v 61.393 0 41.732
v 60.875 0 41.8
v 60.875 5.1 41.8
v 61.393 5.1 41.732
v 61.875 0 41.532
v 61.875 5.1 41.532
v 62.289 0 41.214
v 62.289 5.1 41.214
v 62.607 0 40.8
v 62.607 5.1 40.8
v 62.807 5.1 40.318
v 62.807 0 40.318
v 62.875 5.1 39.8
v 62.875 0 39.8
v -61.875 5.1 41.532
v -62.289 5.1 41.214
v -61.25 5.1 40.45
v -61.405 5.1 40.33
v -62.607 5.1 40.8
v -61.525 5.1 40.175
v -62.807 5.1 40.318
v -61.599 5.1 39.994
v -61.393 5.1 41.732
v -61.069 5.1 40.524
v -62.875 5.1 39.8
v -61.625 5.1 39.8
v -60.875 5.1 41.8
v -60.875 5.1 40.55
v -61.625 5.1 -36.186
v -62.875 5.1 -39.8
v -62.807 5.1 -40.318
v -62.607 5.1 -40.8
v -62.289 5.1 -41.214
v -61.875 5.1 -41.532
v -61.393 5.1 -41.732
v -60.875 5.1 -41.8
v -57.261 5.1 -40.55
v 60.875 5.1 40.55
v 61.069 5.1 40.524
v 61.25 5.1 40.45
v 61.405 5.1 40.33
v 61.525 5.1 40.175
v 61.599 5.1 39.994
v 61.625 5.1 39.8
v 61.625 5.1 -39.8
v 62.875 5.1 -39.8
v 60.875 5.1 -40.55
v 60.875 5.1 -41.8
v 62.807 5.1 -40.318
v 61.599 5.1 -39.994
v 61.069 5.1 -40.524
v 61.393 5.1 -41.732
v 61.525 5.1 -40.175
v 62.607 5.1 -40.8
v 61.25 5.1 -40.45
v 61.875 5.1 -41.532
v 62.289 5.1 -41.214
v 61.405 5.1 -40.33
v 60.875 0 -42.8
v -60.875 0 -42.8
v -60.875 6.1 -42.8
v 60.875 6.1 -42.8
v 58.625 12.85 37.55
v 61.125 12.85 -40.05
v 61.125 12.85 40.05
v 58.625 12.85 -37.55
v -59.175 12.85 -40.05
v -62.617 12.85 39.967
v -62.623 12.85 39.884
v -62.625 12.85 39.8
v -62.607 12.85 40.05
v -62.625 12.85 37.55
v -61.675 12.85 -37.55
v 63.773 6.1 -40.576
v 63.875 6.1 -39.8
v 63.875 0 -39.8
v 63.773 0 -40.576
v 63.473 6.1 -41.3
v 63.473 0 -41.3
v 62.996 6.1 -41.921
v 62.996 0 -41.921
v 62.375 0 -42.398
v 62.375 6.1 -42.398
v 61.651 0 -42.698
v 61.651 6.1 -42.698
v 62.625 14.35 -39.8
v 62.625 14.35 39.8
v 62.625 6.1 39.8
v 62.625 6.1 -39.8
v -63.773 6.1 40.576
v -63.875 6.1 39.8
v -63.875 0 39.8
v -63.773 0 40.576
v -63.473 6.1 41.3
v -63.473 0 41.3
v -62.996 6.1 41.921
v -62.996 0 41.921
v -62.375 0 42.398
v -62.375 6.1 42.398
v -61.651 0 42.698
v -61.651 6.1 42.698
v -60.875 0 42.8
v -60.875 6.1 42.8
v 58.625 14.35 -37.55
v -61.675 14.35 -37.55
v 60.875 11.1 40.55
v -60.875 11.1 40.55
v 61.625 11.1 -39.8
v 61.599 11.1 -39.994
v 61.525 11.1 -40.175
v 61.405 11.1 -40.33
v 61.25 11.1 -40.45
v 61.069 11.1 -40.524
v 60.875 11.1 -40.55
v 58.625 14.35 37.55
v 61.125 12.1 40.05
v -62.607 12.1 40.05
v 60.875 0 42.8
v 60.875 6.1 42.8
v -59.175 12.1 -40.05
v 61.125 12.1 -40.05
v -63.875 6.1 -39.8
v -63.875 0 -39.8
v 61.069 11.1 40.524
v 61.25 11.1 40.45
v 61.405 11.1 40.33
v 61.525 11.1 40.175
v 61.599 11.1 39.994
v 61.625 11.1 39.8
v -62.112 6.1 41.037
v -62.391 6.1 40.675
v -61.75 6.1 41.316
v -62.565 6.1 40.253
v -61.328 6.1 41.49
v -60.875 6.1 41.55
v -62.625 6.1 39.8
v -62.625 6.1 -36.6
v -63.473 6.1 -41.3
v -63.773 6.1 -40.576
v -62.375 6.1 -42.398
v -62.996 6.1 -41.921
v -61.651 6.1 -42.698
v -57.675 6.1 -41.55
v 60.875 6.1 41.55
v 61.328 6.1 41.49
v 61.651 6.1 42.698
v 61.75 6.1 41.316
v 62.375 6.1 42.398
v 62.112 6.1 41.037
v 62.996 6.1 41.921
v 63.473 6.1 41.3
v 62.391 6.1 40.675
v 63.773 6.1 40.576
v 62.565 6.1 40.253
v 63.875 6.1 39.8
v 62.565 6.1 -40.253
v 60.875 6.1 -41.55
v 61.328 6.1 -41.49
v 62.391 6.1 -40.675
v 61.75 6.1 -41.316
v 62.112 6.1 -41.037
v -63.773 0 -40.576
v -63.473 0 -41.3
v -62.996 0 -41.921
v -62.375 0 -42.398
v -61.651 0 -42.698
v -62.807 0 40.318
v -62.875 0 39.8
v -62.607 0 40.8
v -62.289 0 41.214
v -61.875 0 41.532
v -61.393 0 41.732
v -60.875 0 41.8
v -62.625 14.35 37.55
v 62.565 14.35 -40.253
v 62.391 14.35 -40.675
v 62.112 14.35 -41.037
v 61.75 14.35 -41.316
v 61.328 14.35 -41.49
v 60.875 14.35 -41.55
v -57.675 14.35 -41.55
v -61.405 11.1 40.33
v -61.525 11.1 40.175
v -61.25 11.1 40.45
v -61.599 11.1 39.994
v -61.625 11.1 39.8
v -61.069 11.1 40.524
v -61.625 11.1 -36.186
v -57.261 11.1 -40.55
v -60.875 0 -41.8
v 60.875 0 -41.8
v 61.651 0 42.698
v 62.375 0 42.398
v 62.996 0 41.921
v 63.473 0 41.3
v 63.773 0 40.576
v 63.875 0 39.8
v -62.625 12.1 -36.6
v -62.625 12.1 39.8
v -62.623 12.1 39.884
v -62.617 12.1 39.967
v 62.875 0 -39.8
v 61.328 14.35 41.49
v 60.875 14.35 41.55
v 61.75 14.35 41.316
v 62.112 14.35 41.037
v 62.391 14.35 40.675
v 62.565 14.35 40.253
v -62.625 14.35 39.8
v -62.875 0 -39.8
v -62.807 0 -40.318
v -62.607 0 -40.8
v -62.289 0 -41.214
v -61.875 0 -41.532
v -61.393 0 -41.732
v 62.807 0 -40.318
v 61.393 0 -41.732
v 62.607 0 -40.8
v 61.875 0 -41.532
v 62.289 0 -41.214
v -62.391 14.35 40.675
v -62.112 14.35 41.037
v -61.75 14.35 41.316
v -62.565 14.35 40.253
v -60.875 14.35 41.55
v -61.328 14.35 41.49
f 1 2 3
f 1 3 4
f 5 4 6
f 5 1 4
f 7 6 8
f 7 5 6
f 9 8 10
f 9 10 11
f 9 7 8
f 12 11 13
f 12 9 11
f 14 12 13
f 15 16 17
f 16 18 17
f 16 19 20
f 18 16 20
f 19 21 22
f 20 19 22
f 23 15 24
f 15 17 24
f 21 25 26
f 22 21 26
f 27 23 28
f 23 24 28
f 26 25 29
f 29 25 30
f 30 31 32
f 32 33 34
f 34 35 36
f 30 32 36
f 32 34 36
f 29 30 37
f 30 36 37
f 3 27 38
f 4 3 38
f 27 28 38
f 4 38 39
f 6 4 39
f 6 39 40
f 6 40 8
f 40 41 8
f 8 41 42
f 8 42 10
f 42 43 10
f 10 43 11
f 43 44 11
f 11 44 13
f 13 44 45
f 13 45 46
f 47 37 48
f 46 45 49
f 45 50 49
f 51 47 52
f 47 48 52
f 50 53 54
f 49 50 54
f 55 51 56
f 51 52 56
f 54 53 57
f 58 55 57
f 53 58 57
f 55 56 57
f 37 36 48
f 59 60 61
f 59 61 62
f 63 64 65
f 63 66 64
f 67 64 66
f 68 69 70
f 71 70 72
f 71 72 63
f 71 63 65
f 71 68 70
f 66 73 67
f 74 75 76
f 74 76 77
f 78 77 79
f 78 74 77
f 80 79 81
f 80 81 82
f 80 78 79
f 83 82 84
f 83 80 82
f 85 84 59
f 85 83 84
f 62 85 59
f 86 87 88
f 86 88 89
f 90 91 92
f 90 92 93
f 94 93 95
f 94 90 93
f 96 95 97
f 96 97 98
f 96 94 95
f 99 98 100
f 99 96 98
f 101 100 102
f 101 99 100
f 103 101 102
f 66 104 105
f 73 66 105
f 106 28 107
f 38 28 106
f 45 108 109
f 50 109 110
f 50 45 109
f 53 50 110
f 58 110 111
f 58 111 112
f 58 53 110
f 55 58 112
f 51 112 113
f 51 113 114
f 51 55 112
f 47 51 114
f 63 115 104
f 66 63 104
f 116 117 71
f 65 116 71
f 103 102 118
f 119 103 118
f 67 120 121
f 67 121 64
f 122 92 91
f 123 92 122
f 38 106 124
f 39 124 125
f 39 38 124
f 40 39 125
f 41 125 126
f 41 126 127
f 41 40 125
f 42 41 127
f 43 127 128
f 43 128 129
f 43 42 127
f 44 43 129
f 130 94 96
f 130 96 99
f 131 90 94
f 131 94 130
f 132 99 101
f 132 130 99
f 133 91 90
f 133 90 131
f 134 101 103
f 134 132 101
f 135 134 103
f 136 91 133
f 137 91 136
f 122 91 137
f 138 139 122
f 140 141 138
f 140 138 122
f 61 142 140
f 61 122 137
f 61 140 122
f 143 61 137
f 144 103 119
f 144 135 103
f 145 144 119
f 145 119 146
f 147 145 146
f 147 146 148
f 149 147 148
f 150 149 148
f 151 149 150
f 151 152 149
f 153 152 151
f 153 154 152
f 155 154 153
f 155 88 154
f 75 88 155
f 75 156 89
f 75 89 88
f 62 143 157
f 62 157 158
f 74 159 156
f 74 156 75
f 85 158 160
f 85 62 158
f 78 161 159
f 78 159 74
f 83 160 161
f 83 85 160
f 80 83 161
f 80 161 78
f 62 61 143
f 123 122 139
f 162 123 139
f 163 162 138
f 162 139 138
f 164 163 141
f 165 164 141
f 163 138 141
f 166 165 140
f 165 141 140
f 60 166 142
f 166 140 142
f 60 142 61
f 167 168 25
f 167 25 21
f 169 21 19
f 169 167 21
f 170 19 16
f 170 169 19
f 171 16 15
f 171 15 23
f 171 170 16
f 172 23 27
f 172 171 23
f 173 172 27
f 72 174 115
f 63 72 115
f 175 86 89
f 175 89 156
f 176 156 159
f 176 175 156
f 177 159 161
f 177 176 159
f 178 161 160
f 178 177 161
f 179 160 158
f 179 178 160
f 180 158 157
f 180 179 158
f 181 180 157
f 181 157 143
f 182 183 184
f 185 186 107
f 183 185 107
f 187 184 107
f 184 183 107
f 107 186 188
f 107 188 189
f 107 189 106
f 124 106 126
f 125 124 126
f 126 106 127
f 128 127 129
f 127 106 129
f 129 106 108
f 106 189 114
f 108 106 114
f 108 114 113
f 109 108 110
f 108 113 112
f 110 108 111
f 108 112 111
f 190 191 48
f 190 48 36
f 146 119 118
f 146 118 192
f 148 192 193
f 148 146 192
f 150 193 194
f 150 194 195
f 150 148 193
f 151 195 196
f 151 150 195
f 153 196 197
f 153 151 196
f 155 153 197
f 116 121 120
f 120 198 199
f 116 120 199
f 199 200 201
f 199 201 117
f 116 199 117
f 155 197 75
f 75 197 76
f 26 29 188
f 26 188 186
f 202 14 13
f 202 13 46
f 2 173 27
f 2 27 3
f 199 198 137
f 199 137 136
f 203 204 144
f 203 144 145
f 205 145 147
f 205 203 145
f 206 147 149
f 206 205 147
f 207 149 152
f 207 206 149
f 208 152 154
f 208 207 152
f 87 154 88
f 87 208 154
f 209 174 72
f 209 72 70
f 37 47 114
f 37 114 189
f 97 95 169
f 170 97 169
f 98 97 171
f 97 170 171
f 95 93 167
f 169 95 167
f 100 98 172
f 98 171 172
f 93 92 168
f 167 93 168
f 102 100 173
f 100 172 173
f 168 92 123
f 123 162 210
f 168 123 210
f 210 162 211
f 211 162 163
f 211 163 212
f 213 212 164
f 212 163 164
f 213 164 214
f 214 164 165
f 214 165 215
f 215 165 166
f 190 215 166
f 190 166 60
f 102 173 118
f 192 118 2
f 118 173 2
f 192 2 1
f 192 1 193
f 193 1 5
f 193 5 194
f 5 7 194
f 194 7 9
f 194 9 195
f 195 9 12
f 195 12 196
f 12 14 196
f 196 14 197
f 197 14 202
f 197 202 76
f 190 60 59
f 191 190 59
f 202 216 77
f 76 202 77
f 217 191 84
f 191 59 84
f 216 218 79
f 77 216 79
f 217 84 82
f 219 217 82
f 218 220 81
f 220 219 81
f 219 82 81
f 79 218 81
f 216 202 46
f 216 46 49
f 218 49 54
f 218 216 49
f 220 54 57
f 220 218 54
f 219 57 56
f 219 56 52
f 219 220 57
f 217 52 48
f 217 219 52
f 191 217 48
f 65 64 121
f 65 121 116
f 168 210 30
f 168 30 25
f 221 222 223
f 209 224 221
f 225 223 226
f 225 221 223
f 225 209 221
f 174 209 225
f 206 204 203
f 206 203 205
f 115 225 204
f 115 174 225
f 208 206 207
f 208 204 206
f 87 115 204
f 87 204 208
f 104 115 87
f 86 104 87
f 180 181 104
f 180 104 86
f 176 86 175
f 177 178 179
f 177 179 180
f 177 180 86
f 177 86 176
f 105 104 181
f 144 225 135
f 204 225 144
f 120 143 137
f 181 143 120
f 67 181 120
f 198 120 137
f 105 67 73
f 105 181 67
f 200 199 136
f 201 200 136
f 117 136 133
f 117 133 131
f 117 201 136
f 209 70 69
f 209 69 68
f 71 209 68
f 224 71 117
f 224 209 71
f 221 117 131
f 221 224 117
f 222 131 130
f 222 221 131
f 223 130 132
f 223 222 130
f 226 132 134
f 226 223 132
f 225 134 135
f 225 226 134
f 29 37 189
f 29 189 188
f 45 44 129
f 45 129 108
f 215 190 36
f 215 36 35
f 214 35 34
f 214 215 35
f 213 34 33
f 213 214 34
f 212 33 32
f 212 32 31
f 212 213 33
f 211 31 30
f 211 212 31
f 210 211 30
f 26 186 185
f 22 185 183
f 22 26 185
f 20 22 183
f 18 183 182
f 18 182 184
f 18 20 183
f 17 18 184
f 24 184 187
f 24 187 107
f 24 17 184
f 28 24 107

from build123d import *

# Parameters (mm, degrees)
SKETCH1_W           = 127.75
SKETCH1_H           = 85.6
BOSS_EXTRUDE1_DEPTH = 14.35
FILLET1_R           = 3
CUT_FLANGE_DEPTH    = 8.25
SKETCH5_W           = 80.1
SKETCH5_H           = 0.75
CUT_PAPERSLOT_DEPTH = 123.75
CUT_OPENTOP_REACH   = 80.216
SHELL1_DEPTH        = 11.1
SHELL1_2_DEPTH      = 5.1


# Read off the part's stored shape, not the designer's step: Shell1
with BuildPart() as part:
    # Sketch1 → Boss-Extrude1 (new body)
    with BuildSketch(Plane(origin=(0, 0, 0), x_dir=(1, 0, 0), z_dir=(0, 1, 0))):
        Rectangle(SKETCH1_W, SKETCH1_H)
    extrude(amount=BOSS_EXTRUDE1_DEPTH)

    # Fillet1
    fillet1_edges = [part.edges().sort_by_distance(p)[0] for p in [
        (-63.875, 7.175, -42.8),
        (63.875, 7.175, -42.8),
        (63.875, 7.175, 42.8),
        (-63.875, 7.175, 42.8),
    ]]
    fillet(fillet1_edges, radius=FILLET1_R)

    # Sketch3 → Cut-Flange (cut)
    with BuildSketch(Plane(origin=(0, 14.35, 0), x_dir=(1, 0, 0), z_dir=(0, 1, 0))):
        with BuildLine():
            Line((-63.875, 39.8), (-63.875, -39.8))
            ThreePointArc((-63.875, -39.8), (-62.996320344, -41.921320344), (-60.875, -42.8))
            Line((-60.875, -42.8), (60.875, -42.8))
            ThreePointArc((60.875, -42.8), (62.996320344, -41.921320344), (63.875, -39.8))
            Line((63.875, -39.8), (63.875, 39.8))
            ThreePointArc((63.875, 39.8), (62.996320344, 41.921320344), (60.875, 42.8))
            Line((60.875, 42.8), (-60.875, 42.8))
            ThreePointArc((-60.875, 42.8), (-62.996320344, 41.921320344), (-63.875, 39.8))
        make_face()
        with BuildLine():
            Line((-62.625, 36.600252532), (-62.625, -39.8))
            ThreePointArc((-62.625, -39.8), (-62.112436867, -41.037436867), (-60.875, -41.55))
            Line((-60.875, -41.55), (60.875, -41.55))
            ThreePointArc((60.875, -41.55), (62.112436867, -41.037436867), (62.625, -39.8))
            Line((62.625, -39.8), (62.625, 39.8))
            ThreePointArc((62.625, 39.8), (62.112436867, 41.037436867), (60.875, 41.55))
            Line((60.875, 41.55), (-57.675252532, 41.55))
            Line((-57.675252532, 41.55), (-62.625, 36.600252532))
        make_face(mode=Mode.SUBTRACT)
    extrude(amount=-CUT_FLANGE_DEPTH, mode=Mode.SUBTRACT)

    # Sketch5 → Cut-PaperSlot (cut)
    with BuildSketch(Plane.ZY.offset(62.625)):
        with Locations((0, 12.475)):
            Rectangle(SKETCH5_W, SKETCH5_H)
    extrude(amount=-CUT_PAPERSLOT_DEPTH, mode=Mode.SUBTRACT)

    # Sketch6 → Cut-OpenTop (cut, up to next)
    with BuildSketch(Plane(origin=(0, 14.35, 0), x_dir=(1, 0, 0), z_dir=(0, 1, 0)), mode=Mode.PRIVATE) as cut_opentop_sk1:
        Polygon((-57.675252532, 37.55), (-61.675252532, 37.55), (-62.625, 36.600252532), (-62.625, -37.55), (-60.875, -37.55), (58.625, -37.55), (58.625, 37.55), align=None)
    cut_opentop_tool1 = extrude(cut_opentop_sk1.sketch, amount=-CUT_OPENTOP_REACH, mode=Mode.PRIVATE) & part.part
    add(cut_opentop_tool1.solids().sort_by_distance((-1.997013, 14.35, 0.001844))[0], mode=Mode.SUBTRACT)

    # Shell1 outline → Shell1 (cut)
    with BuildSketch(Plane(origin=(0, 0, 0), x_dir=(1, 0, 0), z_dir=(0, 1, 0))):
        with BuildLine():
            Line((-61.625, 36.186038969), (-61.625, -39.8))
            ThreePointArc((-61.625, -39.8), (-61.405330086, -40.330330086), (-60.875, -40.55))
            Line((-60.875, -40.55), (60.875, -40.55))
            ThreePointArc((60.875, -40.55), (61.405330086, -40.330330086), (61.625, -39.8))
            Line((61.625, -39.8), (61.625, 39.8))
            ThreePointArc((61.625, 39.8), (61.405330086, 40.330330086), (60.875, 40.55))
            Line((60.875, 40.55), (-57.261038969, 40.55))
            Line((-57.261038969, 40.55), (-61.625, 36.186038969))
        make_face()
    extrude(amount=SHELL1_DEPTH, mode=Mode.SUBTRACT)

    # Shell1 2 outline → Shell1 2 (cut)
    with BuildSketch(Plane(origin=(0, 0, 0), x_dir=(1, 0, 0), z_dir=(0, 1, 0))):
        with BuildLine():
            Line((-62.875, 39.8), (-62.875, -39.8))
            ThreePointArc((-62.875, -39.8), (-62.289213562, -41.214213562), (-60.875, -41.8))
            Line((-60.875, -41.8), (60.875, -41.8))
            ThreePointArc((60.875, -41.8), (62.289213562, -41.214213562), (62.875, -39.8))
            Line((62.875, -39.8), (62.875, 39.8))
            ThreePointArc((62.875, 39.8), (62.289213562, 41.214213562), (60.875, 41.8))
            Line((60.875, 41.8), (-60.875, 41.8))
            ThreePointArc((-60.875, 41.8), (-62.289213562, 41.214213562), (-62.875, 39.8))
        make_face()
        with BuildLine():
            ThreePointArc((-60.875, -40.55), (-61.405330086, -40.330330086), (-61.625, -39.8))
            Line((-61.625, -39.8), (-61.625, 36.186038969))
            Line((-61.625, 36.186038969), (-57.261038969, 40.55))
            Line((-57.261038969, 40.55), (60.875, 40.55))
            ThreePointArc((60.875, 40.55), (61.405330086, 40.330330086), (61.625, 39.8))
            Line((61.625, 39.8), (61.625, -39.8))
            ThreePointArc((61.625, -39.8), (61.405330086, -40.330330086), (60.875, -40.55))
            Line((60.875, -40.55), (-60.875, -40.55))
        make_face(mode=Mode.SUBTRACT)
    extrude(amount=SHELL1_2_DEPTH, mode=Mode.SUBTRACT)


solid = part.part
